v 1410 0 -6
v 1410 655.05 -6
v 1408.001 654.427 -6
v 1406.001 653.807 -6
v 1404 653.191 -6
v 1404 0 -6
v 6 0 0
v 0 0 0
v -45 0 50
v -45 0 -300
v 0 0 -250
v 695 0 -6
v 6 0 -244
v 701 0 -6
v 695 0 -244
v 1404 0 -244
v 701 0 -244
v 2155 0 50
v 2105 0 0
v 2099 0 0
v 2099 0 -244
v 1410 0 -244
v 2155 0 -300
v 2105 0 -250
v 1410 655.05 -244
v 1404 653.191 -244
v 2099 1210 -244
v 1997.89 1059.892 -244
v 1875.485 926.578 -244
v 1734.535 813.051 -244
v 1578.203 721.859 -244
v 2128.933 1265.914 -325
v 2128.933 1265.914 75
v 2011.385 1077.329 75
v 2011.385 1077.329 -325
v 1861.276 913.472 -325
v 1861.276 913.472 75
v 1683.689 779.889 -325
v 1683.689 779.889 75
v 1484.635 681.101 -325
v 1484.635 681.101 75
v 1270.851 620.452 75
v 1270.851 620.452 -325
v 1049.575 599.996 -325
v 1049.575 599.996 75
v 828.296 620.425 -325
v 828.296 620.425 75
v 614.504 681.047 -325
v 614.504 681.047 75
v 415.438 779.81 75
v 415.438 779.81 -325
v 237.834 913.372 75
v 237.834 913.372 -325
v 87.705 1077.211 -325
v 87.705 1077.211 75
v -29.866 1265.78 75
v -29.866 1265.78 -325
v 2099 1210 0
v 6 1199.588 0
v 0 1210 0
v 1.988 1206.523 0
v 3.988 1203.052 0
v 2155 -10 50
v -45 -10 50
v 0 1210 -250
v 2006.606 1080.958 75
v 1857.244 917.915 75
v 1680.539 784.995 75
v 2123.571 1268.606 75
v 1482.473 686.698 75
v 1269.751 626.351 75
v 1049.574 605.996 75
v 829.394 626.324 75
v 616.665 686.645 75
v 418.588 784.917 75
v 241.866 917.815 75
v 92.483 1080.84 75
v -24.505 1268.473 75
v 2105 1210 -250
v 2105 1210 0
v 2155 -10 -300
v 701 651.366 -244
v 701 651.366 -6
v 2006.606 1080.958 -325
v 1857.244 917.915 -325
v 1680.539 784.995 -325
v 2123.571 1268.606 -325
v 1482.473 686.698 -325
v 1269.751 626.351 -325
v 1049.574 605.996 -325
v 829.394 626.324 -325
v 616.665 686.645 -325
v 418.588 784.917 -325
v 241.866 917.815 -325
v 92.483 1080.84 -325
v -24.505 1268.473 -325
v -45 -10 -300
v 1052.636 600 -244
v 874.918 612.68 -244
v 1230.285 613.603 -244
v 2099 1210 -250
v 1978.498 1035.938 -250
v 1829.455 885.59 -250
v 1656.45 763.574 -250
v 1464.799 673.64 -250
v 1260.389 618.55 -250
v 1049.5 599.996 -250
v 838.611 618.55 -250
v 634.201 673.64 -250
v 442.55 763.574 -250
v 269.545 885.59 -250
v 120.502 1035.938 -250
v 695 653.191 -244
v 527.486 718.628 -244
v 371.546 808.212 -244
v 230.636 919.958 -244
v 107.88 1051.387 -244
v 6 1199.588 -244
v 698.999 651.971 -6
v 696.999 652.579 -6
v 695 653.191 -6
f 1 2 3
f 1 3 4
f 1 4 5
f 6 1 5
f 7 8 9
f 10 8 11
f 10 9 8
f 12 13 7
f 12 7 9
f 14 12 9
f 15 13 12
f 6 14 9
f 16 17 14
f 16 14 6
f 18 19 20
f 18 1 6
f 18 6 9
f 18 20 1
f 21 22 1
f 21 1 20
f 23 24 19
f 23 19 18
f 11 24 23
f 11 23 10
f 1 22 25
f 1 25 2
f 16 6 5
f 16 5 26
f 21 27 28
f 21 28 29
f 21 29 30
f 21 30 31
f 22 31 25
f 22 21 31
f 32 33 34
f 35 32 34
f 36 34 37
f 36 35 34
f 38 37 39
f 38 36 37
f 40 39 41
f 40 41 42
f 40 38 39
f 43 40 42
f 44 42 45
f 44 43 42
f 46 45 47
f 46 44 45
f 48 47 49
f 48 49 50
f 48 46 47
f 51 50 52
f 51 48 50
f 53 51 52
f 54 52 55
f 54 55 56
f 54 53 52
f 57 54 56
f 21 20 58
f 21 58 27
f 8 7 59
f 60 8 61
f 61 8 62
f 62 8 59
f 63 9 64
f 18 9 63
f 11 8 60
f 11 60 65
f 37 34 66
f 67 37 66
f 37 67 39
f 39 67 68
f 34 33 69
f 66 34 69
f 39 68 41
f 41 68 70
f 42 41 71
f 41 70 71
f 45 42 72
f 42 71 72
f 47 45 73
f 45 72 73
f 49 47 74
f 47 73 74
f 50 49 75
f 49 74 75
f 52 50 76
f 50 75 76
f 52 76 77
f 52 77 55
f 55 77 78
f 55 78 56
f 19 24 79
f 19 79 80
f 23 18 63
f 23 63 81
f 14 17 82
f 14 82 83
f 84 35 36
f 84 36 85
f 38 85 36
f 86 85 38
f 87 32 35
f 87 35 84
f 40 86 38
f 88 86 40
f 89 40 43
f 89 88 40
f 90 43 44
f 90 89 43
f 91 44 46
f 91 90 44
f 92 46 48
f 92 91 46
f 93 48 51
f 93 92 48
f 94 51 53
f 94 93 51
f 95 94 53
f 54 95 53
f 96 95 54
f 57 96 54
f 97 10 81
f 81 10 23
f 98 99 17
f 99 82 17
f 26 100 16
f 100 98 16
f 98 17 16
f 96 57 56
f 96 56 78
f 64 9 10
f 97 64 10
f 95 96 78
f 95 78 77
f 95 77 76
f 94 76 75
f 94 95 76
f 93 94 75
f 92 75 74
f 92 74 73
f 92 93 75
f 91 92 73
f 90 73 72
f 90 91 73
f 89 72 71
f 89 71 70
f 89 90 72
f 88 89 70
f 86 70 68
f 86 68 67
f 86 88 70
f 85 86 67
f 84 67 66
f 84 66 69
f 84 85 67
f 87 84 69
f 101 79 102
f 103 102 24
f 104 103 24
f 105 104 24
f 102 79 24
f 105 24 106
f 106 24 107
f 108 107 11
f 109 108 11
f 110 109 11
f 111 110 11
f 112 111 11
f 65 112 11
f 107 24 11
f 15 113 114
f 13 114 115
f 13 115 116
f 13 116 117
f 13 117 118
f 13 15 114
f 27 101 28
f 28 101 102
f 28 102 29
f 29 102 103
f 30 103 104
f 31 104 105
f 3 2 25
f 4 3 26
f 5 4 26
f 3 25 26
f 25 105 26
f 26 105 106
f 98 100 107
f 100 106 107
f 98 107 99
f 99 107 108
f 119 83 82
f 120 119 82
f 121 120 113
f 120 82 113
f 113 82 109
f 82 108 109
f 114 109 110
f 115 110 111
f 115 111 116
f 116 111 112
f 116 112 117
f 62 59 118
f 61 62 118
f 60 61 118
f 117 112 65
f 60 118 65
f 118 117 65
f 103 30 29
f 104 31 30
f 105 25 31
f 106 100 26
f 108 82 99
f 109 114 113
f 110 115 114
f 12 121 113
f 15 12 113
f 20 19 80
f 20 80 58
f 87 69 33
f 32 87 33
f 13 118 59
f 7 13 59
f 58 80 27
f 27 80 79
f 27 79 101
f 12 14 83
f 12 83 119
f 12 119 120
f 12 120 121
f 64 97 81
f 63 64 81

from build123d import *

# Parameters (mm, degrees)
BOSS_EXTRUDE1_DEPTH  = 1210
CUT_EXTRUDE1_DEPTH   = 2441.824655726
SKETCH4_W            = 2200
SKETCH4_H            = 350
BOSS_EXTRUDE2_DEPTH  = 10
BOSS_EXTRUDE14_START = 75
BOSS_EXTRUDE14_DEPTH = 400


with BuildPart() as part:
    # Sketch2 → Boss-Extrude1 (new body)
    with BuildSketch(Plane(origin=(0, 0, 0), x_dir=(1, 0, 0), z_dir=(0, 1, 0))):
        Polygon((0, 0), (0, 250), (1052.5, 250), (2105, 250), (2105, 0), (2099, 0), (2099, 244), (1410, 244), (1410, 6), (1404, 6), (1404, 244), (1052.5, 244), (701, 244), (701, 6), (695, 6), (695, 244), (6, 244), (6, 0), align=None)
    extrude(amount=BOSS_EXTRUDE1_DEPTH)

    # Sketch3 → Cut-Extrude1 (cut, through all)
    with BuildSketch(Plane(origin=(0, 0, -250), x_dir=(-1, 0, 0), z_dir=(0, 0, -1))):
        with BuildLine():
            Line((0, 1210), (-2099, 1210))
            ThreePointArc((-2099, 1210), (-1049.5, 599.996274287), (0, 1210))
        make_face()
    extrude(amount=-CUT_EXTRUDE1_DEPTH, mode=Mode.SUBTRACT)

    # Sketch4 → Boss-Extrude2 (add)
    with BuildSketch(Plane(origin=(0, 0, 0), x_dir=(1, 0, 0), z_dir=(0, 1, 0))):
        with Locations((1055, 125)):
            Rectangle(SKETCH4_W, SKETCH4_H)
    extrude(amount=-BOSS_EXTRUDE2_DEPTH)


with BuildPart() as body_2:
    # Sketch10 → Boss-Extrude14 (new body)
    with BuildSketch(Plane(origin=(0, 0, -250), x_dir=(-1, 0, 0), z_dir=(0, 0, -1)).offset(BOSS_EXTRUDE14_START)):
        with BuildLine():
            Line((29.866493343, 1265.780284504), (24.504622164, 1268.472929571))
            ThreePointArc((24.504622164, 1268.472929571), (-1049.574185027, 605.996276577), (-2123.571198629, 1268.605523867))
            Line((-2123.571198629, 1268.605523867), (-2128.933402185, 1265.913540765))
            ThreePointArc((-2128.933402185, 1265.913540765), (-1049.574555389, 599.996276588), (29.866493343, 1265.780284504))
        make_face()
    extrude(amount=-BOSS_EXTRUDE14_DEPTH)


solid = Compound([part.part, body_2.part])
